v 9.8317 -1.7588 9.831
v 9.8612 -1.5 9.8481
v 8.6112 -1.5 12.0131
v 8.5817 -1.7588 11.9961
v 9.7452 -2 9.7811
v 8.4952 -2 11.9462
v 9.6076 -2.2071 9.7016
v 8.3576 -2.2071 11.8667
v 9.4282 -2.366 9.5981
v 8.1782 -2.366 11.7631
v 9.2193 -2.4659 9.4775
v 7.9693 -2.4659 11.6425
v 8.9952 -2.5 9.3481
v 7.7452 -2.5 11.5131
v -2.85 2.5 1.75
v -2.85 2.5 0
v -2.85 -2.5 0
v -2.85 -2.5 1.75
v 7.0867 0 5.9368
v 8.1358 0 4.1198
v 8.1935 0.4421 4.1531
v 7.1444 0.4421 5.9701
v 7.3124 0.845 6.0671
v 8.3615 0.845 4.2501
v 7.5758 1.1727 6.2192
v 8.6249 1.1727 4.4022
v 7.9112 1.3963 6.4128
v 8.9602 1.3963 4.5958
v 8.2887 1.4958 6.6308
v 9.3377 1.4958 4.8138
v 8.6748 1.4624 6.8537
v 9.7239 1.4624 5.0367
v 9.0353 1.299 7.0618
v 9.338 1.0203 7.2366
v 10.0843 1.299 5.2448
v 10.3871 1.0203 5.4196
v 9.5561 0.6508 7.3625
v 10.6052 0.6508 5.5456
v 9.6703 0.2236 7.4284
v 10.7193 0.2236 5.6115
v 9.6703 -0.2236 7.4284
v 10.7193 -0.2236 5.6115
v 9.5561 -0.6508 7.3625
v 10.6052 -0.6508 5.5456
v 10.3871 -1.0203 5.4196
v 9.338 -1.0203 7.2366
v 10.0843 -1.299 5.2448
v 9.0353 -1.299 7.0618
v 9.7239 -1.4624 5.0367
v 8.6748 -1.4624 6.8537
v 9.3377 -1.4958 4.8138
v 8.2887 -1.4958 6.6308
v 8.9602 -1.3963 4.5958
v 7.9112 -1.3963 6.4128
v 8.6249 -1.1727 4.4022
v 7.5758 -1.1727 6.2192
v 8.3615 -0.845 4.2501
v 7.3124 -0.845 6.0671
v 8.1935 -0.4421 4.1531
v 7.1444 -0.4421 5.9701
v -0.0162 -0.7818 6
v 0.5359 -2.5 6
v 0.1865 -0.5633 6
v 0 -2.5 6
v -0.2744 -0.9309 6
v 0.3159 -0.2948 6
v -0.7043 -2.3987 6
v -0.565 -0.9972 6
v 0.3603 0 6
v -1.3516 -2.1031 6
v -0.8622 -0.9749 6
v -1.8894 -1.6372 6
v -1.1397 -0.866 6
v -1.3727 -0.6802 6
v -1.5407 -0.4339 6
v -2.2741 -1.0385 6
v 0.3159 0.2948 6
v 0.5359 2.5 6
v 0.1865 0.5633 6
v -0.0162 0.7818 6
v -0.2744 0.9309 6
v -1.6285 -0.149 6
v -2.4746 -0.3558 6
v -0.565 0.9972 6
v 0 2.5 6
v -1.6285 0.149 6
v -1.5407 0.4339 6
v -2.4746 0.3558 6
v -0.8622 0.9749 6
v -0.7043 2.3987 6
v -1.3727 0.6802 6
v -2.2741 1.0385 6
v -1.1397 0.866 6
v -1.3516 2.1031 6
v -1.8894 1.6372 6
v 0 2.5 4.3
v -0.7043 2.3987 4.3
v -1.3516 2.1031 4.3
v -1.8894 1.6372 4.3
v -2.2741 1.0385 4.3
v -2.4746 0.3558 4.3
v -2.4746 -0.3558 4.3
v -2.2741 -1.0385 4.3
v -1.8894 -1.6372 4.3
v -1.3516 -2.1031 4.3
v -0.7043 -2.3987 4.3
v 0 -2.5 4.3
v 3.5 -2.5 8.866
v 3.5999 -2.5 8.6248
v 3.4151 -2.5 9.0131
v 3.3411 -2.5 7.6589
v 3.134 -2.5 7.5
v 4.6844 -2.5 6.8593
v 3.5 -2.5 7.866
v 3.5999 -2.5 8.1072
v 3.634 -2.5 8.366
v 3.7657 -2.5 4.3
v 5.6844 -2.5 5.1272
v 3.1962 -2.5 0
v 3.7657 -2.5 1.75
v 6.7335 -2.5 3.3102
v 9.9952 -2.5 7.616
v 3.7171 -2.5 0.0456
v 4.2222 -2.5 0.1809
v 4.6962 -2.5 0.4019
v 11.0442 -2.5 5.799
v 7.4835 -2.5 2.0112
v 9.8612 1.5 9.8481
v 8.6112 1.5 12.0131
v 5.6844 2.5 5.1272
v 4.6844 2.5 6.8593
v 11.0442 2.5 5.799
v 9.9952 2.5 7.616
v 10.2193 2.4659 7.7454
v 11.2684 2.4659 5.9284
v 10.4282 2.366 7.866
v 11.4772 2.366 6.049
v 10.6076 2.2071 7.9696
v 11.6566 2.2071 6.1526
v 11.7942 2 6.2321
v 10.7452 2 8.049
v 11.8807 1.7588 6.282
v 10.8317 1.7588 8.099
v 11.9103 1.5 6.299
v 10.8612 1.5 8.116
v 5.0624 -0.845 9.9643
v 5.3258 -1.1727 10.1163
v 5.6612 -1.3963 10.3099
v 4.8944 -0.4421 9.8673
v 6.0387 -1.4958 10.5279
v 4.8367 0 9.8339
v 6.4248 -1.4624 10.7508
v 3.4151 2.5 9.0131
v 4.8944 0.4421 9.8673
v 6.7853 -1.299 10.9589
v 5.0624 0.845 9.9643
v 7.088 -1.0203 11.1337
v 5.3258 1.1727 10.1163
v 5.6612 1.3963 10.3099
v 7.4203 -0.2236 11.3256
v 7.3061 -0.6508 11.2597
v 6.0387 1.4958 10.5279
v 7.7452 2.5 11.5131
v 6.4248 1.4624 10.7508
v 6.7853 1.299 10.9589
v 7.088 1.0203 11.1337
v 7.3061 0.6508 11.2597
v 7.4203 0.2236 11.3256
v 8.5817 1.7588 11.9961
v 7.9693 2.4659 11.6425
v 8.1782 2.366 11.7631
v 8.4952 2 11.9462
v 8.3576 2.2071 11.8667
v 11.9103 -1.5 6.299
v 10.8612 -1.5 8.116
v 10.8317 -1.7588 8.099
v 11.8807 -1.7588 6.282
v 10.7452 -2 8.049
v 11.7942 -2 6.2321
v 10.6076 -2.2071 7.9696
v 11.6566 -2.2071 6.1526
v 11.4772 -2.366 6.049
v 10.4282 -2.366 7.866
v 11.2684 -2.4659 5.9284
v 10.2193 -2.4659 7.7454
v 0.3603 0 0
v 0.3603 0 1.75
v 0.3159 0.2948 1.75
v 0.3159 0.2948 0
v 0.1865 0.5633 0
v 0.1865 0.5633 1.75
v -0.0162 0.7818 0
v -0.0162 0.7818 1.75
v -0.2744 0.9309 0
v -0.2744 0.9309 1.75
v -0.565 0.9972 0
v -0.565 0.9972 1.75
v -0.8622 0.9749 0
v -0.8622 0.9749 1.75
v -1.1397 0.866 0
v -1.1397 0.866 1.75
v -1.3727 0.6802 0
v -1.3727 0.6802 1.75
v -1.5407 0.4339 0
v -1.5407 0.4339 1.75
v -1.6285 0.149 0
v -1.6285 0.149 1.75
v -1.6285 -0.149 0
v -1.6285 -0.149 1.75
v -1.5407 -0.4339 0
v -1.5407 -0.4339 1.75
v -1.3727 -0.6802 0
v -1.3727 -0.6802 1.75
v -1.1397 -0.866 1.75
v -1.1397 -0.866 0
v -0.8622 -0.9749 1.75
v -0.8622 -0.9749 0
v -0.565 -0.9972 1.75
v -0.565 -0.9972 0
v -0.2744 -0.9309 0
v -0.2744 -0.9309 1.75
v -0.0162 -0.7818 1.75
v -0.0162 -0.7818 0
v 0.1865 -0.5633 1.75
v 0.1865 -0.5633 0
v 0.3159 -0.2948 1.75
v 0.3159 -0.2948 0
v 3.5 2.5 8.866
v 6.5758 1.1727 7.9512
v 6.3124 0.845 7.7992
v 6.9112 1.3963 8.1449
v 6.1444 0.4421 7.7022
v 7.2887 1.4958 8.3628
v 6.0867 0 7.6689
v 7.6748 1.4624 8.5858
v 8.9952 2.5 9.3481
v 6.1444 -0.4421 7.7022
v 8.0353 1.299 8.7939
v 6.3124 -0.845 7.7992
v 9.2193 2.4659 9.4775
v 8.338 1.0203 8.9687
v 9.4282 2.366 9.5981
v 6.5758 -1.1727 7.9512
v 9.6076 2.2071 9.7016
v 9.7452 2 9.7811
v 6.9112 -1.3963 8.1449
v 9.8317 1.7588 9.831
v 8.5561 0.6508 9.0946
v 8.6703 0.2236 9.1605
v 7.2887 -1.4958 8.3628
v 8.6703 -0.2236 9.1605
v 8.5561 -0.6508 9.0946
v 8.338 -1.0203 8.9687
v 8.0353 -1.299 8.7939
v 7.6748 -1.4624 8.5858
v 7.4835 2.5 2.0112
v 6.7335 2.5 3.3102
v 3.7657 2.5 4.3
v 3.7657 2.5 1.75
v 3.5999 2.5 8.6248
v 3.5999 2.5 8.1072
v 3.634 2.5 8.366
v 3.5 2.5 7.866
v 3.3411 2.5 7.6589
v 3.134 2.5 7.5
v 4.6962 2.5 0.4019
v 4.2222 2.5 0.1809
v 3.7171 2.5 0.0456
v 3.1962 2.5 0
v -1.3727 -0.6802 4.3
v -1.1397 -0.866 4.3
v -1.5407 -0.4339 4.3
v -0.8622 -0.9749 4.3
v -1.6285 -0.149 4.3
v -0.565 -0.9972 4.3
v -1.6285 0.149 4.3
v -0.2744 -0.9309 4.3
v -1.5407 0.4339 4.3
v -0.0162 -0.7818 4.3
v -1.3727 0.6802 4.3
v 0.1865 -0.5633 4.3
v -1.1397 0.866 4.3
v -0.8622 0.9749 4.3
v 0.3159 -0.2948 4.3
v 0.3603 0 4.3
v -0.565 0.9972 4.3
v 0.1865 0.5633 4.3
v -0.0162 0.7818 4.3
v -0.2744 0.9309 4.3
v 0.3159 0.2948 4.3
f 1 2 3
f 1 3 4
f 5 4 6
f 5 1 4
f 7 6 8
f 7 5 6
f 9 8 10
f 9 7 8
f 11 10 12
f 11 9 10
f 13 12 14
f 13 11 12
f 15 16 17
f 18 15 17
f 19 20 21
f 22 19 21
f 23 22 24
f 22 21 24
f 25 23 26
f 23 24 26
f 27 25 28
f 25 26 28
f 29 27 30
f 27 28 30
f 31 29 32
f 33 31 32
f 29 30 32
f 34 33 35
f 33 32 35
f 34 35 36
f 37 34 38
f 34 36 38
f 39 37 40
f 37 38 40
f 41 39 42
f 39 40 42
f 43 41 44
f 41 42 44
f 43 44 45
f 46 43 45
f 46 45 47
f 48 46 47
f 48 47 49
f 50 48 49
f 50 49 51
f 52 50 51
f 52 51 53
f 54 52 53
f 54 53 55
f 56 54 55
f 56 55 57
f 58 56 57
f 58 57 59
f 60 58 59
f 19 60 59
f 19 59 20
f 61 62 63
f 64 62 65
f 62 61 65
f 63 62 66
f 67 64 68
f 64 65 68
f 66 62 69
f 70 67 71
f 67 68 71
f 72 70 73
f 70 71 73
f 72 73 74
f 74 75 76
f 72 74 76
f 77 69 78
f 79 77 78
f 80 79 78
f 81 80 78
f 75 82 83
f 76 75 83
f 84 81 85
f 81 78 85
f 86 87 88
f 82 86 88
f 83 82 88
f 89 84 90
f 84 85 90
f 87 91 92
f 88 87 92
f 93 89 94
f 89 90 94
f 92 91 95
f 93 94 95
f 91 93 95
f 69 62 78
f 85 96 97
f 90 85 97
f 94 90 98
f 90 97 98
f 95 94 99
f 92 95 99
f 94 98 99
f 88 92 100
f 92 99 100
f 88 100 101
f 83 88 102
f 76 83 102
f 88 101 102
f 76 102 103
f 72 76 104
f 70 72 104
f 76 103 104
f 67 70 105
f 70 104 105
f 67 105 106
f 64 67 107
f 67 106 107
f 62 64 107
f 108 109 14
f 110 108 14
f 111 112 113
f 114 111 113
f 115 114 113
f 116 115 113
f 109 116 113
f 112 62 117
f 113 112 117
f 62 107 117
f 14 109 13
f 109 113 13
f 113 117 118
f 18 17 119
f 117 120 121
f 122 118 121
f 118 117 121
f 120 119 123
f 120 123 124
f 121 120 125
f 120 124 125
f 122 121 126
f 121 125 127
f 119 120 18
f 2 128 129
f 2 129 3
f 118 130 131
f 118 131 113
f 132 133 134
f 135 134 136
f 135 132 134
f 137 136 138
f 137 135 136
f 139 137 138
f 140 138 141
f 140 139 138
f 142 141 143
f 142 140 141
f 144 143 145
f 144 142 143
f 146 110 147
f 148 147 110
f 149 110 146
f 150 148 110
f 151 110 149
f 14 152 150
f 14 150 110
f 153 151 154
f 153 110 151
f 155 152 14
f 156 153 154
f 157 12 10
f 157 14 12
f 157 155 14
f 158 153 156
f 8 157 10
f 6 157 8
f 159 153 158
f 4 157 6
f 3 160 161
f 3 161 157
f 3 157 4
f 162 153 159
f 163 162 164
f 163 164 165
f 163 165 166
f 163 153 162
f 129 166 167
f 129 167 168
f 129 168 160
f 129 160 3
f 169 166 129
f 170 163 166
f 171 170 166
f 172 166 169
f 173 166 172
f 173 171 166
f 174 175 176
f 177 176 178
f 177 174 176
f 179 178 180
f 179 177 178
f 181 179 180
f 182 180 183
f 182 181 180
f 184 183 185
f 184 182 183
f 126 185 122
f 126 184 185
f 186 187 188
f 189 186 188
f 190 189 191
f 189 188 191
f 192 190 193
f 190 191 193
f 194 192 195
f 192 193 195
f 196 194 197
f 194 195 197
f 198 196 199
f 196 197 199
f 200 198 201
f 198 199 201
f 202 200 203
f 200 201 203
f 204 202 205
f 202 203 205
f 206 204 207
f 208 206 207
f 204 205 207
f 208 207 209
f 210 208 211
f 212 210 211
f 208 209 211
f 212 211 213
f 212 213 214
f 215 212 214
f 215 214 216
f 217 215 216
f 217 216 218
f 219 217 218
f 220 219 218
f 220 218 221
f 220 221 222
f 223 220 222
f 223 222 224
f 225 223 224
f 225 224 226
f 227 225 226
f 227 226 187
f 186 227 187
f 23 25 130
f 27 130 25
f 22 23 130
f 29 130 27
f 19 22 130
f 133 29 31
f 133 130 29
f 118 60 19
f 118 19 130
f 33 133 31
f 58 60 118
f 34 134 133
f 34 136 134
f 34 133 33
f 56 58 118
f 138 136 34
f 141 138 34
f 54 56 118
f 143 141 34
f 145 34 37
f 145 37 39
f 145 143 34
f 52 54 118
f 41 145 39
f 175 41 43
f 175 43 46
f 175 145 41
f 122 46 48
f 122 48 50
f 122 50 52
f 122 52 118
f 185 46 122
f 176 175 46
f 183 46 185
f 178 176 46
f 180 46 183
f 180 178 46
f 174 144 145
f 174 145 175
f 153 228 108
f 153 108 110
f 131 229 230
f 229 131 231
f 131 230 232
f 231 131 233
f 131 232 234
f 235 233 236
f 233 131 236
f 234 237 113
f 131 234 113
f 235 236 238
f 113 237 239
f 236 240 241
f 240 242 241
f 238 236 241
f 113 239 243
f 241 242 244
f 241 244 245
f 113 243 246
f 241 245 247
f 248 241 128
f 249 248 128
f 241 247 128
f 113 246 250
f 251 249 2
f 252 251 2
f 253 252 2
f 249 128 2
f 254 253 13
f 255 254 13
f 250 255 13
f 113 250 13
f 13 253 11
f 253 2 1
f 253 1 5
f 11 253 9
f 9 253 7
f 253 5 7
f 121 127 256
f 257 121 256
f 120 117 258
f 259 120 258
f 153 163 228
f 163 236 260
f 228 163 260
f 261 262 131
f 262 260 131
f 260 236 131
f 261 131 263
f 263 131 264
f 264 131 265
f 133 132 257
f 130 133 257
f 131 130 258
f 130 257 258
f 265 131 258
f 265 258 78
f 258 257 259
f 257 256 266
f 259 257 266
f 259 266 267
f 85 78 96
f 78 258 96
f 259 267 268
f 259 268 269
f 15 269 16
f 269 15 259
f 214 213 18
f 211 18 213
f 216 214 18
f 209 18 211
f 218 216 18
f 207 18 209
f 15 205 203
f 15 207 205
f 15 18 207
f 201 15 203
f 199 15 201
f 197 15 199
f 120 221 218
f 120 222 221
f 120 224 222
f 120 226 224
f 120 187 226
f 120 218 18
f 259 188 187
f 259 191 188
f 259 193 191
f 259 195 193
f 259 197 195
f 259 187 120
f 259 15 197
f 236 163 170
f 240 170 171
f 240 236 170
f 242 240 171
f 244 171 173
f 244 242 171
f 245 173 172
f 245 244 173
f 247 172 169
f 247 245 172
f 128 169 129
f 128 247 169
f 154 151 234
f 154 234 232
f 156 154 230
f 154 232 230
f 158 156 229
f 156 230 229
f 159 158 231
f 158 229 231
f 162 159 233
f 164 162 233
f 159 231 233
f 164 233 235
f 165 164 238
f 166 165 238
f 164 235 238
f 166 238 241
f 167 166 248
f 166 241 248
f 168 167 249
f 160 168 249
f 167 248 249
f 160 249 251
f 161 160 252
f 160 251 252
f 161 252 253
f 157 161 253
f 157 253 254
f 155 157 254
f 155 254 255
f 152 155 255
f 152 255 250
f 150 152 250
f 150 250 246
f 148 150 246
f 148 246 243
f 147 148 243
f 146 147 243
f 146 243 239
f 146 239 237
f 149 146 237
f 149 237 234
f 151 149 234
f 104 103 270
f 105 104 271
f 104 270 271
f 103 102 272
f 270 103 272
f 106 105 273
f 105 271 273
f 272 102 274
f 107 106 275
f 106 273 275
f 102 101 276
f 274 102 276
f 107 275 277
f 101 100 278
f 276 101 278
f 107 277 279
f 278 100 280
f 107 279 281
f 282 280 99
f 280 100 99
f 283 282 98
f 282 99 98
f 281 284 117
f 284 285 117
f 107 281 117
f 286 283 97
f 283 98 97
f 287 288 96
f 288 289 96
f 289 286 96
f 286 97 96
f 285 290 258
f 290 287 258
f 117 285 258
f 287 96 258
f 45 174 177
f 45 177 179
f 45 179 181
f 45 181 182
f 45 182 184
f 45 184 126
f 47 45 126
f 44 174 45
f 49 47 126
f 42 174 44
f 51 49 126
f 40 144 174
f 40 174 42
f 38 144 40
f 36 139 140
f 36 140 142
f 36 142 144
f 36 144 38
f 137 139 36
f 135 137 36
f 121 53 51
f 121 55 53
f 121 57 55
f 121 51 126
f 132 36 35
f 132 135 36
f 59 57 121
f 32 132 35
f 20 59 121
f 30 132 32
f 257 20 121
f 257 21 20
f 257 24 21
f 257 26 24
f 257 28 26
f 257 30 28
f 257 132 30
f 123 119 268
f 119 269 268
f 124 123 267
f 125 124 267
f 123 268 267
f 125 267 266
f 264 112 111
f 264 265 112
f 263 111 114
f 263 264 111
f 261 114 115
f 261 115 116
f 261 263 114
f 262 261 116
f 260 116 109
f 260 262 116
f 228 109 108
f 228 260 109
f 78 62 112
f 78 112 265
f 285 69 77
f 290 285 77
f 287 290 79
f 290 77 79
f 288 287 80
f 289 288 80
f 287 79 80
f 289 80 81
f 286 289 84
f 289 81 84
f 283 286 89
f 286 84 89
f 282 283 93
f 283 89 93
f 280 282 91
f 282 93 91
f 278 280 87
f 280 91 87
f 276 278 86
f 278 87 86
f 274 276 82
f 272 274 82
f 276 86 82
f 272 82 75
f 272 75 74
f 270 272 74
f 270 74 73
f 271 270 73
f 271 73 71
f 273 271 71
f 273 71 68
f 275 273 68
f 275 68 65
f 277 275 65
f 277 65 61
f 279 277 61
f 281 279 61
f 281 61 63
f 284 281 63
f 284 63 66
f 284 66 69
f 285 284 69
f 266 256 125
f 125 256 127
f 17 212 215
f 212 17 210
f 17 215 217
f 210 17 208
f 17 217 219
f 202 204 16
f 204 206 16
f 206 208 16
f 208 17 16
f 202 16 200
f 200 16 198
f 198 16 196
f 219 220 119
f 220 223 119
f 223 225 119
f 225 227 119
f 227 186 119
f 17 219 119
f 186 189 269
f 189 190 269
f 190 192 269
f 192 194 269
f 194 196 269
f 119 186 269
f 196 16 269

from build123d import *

# Parameters (mm, degrees)
SKETCH_1_R               = 2.5
EXTRUDE_1_DEPTH          = 6
SKETCH_2_W               = 4
SKETCH_2_H               = 5
EXTRUDE_2_DEPTH          = 6
SKETCH_13_W              = 5
SKETCH_13_H              = 10
EXTRUDE_4_DEPTH          = 5
EXTRUDE_4_DEPTH_BACK     = 4.598076
SKETCH_14_W              = 5
SKETCH_14_H              = 5.9776452
CUT_EXTRUDE_6_DEPTH      = 1
CUT_EXTRUDE_6_DEPTH_BACK = 1
SKETCH_5_R               = 1
CUT_EXTRUDE_2_DEPTH      = 7
CUT_EXTRUDE_3_DEPTH      = 1.3
CUT_EXTRUDE_3_DEPTH_BACK = 1.25
SKETCH_17_W              = 2.669872981
SKETCH_17_H              = 5
CUT_EXTRUDE_8_DEPTH      = 4
FILLET_1_R               = 1
FILLET_2_R               = 3
SKETCH_15_R              = 1.5
CUT_EXTRUDE_7_DEPTH      = 5.330126966
CUT_EXTRUDE_7_DEPTH_BACK = 15.778684177
FILLET_3_R               = 1
EXTRUDE_5_DEPTH          = 1.75
SKETCH_18_W              = 6.370272001
SKETCH_18_H              = 5.288650256
CUT_EXTRUDE_9_DEPTH      = 1.5
CUT_EXTRUDE_10_DEPTH     = 1.5


with BuildPart() as part:
    # Sketch 1 → Extrude 1 (new body)
    with BuildSketch(Plane.XY):
        Circle(SKETCH_1_R)
    extrude(amount=EXTRUDE_1_DEPTH)

    # Sketch 2 → Extrude 2 (add)
    with BuildSketch(Plane(origin=(0, 0, 0), x_dir=(-1, 0, 0), z_dir=(0, 0, -1))):
        with Locations((-2, 0)):
            Rectangle(SKETCH_2_W, SKETCH_2_H)
    extrude(amount=-EXTRUDE_2_DEPTH)

    # Sketch 13 → Extrude 4 (add, two sides)
    with BuildSketch(Plane(origin=(-1.299038106, 0, 2.25), x_dir=(0, -1, 0), z_dir=(-0.5, 0, 0.866025404))) as extrude_4_sk:
        with Locations((0, 8.464101615)):
            Rectangle(SKETCH_13_W, SKETCH_13_H)
    extrude(amount=EXTRUDE_4_DEPTH)
    extrude(extrude_4_sk.sketch, amount=-EXTRUDE_4_DEPTH_BACK)

    # Sketch 14 → Cut-Extrude 6 (cut, two sides)
    with BuildSketch(Plane(origin=(-1.299038106, 0, 2.25), x_dir=(0, -1, 0), z_dir=(-0.5, 0, 0.866025404))) as cut_extrude_6_sk:
        with Locations((0, 10.475279015)):
            Rectangle(SKETCH_14_W, SKETCH_14_H)
    extrude(amount=CUT_EXTRUDE_6_DEPTH, mode=Mode.SUBTRACT)
    extrude(cut_extrude_6_sk.sketch, amount=-CUT_EXTRUDE_6_DEPTH_BACK, mode=Mode.SUBTRACT)

    # Sketch 5 → Cut-Extrude 2 (cut, through all)
    with BuildSketch(Plane.XY.offset(6)):
        with Locations((-0.639695784, 0)):
            Circle(SKETCH_5_R)
    extrude(amount=-CUT_EXTRUDE_2_DEPTH, mode=Mode.SUBTRACT)

    # Sketch 6 → Cut-Extrude 3 (cut, two sides)
    with BuildSketch(Plane.XY.offset(3)) as cut_extrude_3_sk:
        with BuildLine():
            Line((3.765698608, 2.5), (0, 2.5))
            ThreePointArc((0, 2.5), (-2.5, 0), (0, -2.5))
            Line((0, -2.5), (3.765698608, -2.5))
            Line((3.765698608, -2.5), (3.765698608, 2.5))
        make_face()
    extrude(amount=CUT_EXTRUDE_3_DEPTH, mode=Mode.SUBTRACT)
    extrude(cut_extrude_3_sk.sketch, amount=-CUT_EXTRUDE_3_DEPTH_BACK, mode=Mode.SUBTRACT)

    # Sketch 17 → Cut-Extrude 8 (cut)
    with BuildSketch(Plane(origin=(3, 0, 1.732050808), x_dir=(-0.5, 0, 0.866025404), z_dir=(-0.866025404, 0, -0.5))):
        with Locations((6.26313972, 0)):
            Rectangle(SKETCH_17_W, SKETCH_17_H)
    extrude(amount=-CUT_EXTRUDE_8_DEPTH, mode=Mode.SUBTRACT)

    # Fillet 1
    fillet_1_edges = [part.edges().sort_by_distance(p)[0] for p in [
        (2.665063509, 0, 10.312177826),
        (4, 0, 8),
    ]]
    fillet(fillet_1_edges, radius=FILLET_1_R)

    # Fillet 2
    fillet_2_edges = [part.edges().sort_by_distance(p)[0] for p in [
        (4, 0, 0),
    ]]
    fillet(fillet_2_edges, radius=FILLET_2_R)

    # Sketch 15 → Cut-Extrude 7 (cut, two sides)
    with BuildSketch(Plane(origin=(1, 0, -1.732050808), x_dir=(-0.866025404, 0, -0.5), z_dir=(0.5, 0, -0.866025404))) as cut_extrude_7_sk:
        with Locations((-10.605683392, 0)):
            Circle(SKETCH_15_R)
    extrude(amount=CUT_EXTRUDE_7_DEPTH, mode=Mode.SUBTRACT)
    extrude(cut_extrude_7_sk.sketch, amount=-CUT_EXTRUDE_7_DEPTH_BACK, mode=Mode.SUBTRACT)

    # Fillet 3
    fillet_3_edges = [part.edges().sort_by_distance(p)[0] for p in [
        (8.861215932, 2.5, 11.580127019),
        (8.861215932, -2.5, 11.580127019),
        (11.760734932, -2.5, 6.558012793),
        (11.760734932, 2.5, 6.558012793),
    ]]
    fillet(fillet_3_edges, radius=FILLET_3_R)

    # Sketch 16 → Extrude 5 (add)
    with BuildSketch(Plane(origin=(0, 0, 0), x_dir=(-1, 0, 0), z_dir=(0, 0, -1))):
        with BuildLine():
            Line((0, 2.5), (2.85, 2.5))
            Line((2.85, 2.5), (2.85, -2.5))
            Line((2.85, -2.5), (0, -2.5))
            ThreePointArc((0, -2.5), (2.5, 0), (0, 2.5))
        make_face()
    extrude(amount=-EXTRUDE_5_DEPTH)

    # Sketch 18 → Cut-Extrude 9 (cut)
    with BuildSketch(Plane(origin=(-3.799038106, 0, 6.580127019), x_dir=(0.866025404, 0, 0.5), z_dir=(-0.5, 0, 0.866025404))):
        with Locations((10.278965615, -0.144325128)):
            Rectangle(SKETCH_18_W, SKETCH_18_H)
    extrude(amount=-CUT_EXTRUDE_9_DEPTH, mode=Mode.SUBTRACT)

    # Sketch 19 → Cut-Extrude 10 (cut)
    with BuildSketch(Plane(origin=(1, 0, -1.732050808), x_dir=(-0.866025404, 0, -0.5), z_dir=(0.5, 0, -0.866025404))):
        with BuildLine():
            Line((-13.464101615, 1.5), (-13.464101615, -1.5))
            ThreePointArc((-13.464101615, -1.5), (-13.171208396, -2.207106781), (-12.464101615, -2.5))
            Line((-12.464101615, -2.5), (-7.486456415, -2.5))
            Line((-7.486456415, -2.5), (-7.486456415, 2.5))
            Line((-7.486456415, 2.5), (-12.464101615, 2.5))
            ThreePointArc((-12.464101615, 2.5), (-13.171208396, 2.207106781), (-13.464101615, 1.5))
        make_face()
    extrude(amount=-CUT_EXTRUDE_10_DEPTH, mode=Mode.SUBTRACT)


solid = part.part
